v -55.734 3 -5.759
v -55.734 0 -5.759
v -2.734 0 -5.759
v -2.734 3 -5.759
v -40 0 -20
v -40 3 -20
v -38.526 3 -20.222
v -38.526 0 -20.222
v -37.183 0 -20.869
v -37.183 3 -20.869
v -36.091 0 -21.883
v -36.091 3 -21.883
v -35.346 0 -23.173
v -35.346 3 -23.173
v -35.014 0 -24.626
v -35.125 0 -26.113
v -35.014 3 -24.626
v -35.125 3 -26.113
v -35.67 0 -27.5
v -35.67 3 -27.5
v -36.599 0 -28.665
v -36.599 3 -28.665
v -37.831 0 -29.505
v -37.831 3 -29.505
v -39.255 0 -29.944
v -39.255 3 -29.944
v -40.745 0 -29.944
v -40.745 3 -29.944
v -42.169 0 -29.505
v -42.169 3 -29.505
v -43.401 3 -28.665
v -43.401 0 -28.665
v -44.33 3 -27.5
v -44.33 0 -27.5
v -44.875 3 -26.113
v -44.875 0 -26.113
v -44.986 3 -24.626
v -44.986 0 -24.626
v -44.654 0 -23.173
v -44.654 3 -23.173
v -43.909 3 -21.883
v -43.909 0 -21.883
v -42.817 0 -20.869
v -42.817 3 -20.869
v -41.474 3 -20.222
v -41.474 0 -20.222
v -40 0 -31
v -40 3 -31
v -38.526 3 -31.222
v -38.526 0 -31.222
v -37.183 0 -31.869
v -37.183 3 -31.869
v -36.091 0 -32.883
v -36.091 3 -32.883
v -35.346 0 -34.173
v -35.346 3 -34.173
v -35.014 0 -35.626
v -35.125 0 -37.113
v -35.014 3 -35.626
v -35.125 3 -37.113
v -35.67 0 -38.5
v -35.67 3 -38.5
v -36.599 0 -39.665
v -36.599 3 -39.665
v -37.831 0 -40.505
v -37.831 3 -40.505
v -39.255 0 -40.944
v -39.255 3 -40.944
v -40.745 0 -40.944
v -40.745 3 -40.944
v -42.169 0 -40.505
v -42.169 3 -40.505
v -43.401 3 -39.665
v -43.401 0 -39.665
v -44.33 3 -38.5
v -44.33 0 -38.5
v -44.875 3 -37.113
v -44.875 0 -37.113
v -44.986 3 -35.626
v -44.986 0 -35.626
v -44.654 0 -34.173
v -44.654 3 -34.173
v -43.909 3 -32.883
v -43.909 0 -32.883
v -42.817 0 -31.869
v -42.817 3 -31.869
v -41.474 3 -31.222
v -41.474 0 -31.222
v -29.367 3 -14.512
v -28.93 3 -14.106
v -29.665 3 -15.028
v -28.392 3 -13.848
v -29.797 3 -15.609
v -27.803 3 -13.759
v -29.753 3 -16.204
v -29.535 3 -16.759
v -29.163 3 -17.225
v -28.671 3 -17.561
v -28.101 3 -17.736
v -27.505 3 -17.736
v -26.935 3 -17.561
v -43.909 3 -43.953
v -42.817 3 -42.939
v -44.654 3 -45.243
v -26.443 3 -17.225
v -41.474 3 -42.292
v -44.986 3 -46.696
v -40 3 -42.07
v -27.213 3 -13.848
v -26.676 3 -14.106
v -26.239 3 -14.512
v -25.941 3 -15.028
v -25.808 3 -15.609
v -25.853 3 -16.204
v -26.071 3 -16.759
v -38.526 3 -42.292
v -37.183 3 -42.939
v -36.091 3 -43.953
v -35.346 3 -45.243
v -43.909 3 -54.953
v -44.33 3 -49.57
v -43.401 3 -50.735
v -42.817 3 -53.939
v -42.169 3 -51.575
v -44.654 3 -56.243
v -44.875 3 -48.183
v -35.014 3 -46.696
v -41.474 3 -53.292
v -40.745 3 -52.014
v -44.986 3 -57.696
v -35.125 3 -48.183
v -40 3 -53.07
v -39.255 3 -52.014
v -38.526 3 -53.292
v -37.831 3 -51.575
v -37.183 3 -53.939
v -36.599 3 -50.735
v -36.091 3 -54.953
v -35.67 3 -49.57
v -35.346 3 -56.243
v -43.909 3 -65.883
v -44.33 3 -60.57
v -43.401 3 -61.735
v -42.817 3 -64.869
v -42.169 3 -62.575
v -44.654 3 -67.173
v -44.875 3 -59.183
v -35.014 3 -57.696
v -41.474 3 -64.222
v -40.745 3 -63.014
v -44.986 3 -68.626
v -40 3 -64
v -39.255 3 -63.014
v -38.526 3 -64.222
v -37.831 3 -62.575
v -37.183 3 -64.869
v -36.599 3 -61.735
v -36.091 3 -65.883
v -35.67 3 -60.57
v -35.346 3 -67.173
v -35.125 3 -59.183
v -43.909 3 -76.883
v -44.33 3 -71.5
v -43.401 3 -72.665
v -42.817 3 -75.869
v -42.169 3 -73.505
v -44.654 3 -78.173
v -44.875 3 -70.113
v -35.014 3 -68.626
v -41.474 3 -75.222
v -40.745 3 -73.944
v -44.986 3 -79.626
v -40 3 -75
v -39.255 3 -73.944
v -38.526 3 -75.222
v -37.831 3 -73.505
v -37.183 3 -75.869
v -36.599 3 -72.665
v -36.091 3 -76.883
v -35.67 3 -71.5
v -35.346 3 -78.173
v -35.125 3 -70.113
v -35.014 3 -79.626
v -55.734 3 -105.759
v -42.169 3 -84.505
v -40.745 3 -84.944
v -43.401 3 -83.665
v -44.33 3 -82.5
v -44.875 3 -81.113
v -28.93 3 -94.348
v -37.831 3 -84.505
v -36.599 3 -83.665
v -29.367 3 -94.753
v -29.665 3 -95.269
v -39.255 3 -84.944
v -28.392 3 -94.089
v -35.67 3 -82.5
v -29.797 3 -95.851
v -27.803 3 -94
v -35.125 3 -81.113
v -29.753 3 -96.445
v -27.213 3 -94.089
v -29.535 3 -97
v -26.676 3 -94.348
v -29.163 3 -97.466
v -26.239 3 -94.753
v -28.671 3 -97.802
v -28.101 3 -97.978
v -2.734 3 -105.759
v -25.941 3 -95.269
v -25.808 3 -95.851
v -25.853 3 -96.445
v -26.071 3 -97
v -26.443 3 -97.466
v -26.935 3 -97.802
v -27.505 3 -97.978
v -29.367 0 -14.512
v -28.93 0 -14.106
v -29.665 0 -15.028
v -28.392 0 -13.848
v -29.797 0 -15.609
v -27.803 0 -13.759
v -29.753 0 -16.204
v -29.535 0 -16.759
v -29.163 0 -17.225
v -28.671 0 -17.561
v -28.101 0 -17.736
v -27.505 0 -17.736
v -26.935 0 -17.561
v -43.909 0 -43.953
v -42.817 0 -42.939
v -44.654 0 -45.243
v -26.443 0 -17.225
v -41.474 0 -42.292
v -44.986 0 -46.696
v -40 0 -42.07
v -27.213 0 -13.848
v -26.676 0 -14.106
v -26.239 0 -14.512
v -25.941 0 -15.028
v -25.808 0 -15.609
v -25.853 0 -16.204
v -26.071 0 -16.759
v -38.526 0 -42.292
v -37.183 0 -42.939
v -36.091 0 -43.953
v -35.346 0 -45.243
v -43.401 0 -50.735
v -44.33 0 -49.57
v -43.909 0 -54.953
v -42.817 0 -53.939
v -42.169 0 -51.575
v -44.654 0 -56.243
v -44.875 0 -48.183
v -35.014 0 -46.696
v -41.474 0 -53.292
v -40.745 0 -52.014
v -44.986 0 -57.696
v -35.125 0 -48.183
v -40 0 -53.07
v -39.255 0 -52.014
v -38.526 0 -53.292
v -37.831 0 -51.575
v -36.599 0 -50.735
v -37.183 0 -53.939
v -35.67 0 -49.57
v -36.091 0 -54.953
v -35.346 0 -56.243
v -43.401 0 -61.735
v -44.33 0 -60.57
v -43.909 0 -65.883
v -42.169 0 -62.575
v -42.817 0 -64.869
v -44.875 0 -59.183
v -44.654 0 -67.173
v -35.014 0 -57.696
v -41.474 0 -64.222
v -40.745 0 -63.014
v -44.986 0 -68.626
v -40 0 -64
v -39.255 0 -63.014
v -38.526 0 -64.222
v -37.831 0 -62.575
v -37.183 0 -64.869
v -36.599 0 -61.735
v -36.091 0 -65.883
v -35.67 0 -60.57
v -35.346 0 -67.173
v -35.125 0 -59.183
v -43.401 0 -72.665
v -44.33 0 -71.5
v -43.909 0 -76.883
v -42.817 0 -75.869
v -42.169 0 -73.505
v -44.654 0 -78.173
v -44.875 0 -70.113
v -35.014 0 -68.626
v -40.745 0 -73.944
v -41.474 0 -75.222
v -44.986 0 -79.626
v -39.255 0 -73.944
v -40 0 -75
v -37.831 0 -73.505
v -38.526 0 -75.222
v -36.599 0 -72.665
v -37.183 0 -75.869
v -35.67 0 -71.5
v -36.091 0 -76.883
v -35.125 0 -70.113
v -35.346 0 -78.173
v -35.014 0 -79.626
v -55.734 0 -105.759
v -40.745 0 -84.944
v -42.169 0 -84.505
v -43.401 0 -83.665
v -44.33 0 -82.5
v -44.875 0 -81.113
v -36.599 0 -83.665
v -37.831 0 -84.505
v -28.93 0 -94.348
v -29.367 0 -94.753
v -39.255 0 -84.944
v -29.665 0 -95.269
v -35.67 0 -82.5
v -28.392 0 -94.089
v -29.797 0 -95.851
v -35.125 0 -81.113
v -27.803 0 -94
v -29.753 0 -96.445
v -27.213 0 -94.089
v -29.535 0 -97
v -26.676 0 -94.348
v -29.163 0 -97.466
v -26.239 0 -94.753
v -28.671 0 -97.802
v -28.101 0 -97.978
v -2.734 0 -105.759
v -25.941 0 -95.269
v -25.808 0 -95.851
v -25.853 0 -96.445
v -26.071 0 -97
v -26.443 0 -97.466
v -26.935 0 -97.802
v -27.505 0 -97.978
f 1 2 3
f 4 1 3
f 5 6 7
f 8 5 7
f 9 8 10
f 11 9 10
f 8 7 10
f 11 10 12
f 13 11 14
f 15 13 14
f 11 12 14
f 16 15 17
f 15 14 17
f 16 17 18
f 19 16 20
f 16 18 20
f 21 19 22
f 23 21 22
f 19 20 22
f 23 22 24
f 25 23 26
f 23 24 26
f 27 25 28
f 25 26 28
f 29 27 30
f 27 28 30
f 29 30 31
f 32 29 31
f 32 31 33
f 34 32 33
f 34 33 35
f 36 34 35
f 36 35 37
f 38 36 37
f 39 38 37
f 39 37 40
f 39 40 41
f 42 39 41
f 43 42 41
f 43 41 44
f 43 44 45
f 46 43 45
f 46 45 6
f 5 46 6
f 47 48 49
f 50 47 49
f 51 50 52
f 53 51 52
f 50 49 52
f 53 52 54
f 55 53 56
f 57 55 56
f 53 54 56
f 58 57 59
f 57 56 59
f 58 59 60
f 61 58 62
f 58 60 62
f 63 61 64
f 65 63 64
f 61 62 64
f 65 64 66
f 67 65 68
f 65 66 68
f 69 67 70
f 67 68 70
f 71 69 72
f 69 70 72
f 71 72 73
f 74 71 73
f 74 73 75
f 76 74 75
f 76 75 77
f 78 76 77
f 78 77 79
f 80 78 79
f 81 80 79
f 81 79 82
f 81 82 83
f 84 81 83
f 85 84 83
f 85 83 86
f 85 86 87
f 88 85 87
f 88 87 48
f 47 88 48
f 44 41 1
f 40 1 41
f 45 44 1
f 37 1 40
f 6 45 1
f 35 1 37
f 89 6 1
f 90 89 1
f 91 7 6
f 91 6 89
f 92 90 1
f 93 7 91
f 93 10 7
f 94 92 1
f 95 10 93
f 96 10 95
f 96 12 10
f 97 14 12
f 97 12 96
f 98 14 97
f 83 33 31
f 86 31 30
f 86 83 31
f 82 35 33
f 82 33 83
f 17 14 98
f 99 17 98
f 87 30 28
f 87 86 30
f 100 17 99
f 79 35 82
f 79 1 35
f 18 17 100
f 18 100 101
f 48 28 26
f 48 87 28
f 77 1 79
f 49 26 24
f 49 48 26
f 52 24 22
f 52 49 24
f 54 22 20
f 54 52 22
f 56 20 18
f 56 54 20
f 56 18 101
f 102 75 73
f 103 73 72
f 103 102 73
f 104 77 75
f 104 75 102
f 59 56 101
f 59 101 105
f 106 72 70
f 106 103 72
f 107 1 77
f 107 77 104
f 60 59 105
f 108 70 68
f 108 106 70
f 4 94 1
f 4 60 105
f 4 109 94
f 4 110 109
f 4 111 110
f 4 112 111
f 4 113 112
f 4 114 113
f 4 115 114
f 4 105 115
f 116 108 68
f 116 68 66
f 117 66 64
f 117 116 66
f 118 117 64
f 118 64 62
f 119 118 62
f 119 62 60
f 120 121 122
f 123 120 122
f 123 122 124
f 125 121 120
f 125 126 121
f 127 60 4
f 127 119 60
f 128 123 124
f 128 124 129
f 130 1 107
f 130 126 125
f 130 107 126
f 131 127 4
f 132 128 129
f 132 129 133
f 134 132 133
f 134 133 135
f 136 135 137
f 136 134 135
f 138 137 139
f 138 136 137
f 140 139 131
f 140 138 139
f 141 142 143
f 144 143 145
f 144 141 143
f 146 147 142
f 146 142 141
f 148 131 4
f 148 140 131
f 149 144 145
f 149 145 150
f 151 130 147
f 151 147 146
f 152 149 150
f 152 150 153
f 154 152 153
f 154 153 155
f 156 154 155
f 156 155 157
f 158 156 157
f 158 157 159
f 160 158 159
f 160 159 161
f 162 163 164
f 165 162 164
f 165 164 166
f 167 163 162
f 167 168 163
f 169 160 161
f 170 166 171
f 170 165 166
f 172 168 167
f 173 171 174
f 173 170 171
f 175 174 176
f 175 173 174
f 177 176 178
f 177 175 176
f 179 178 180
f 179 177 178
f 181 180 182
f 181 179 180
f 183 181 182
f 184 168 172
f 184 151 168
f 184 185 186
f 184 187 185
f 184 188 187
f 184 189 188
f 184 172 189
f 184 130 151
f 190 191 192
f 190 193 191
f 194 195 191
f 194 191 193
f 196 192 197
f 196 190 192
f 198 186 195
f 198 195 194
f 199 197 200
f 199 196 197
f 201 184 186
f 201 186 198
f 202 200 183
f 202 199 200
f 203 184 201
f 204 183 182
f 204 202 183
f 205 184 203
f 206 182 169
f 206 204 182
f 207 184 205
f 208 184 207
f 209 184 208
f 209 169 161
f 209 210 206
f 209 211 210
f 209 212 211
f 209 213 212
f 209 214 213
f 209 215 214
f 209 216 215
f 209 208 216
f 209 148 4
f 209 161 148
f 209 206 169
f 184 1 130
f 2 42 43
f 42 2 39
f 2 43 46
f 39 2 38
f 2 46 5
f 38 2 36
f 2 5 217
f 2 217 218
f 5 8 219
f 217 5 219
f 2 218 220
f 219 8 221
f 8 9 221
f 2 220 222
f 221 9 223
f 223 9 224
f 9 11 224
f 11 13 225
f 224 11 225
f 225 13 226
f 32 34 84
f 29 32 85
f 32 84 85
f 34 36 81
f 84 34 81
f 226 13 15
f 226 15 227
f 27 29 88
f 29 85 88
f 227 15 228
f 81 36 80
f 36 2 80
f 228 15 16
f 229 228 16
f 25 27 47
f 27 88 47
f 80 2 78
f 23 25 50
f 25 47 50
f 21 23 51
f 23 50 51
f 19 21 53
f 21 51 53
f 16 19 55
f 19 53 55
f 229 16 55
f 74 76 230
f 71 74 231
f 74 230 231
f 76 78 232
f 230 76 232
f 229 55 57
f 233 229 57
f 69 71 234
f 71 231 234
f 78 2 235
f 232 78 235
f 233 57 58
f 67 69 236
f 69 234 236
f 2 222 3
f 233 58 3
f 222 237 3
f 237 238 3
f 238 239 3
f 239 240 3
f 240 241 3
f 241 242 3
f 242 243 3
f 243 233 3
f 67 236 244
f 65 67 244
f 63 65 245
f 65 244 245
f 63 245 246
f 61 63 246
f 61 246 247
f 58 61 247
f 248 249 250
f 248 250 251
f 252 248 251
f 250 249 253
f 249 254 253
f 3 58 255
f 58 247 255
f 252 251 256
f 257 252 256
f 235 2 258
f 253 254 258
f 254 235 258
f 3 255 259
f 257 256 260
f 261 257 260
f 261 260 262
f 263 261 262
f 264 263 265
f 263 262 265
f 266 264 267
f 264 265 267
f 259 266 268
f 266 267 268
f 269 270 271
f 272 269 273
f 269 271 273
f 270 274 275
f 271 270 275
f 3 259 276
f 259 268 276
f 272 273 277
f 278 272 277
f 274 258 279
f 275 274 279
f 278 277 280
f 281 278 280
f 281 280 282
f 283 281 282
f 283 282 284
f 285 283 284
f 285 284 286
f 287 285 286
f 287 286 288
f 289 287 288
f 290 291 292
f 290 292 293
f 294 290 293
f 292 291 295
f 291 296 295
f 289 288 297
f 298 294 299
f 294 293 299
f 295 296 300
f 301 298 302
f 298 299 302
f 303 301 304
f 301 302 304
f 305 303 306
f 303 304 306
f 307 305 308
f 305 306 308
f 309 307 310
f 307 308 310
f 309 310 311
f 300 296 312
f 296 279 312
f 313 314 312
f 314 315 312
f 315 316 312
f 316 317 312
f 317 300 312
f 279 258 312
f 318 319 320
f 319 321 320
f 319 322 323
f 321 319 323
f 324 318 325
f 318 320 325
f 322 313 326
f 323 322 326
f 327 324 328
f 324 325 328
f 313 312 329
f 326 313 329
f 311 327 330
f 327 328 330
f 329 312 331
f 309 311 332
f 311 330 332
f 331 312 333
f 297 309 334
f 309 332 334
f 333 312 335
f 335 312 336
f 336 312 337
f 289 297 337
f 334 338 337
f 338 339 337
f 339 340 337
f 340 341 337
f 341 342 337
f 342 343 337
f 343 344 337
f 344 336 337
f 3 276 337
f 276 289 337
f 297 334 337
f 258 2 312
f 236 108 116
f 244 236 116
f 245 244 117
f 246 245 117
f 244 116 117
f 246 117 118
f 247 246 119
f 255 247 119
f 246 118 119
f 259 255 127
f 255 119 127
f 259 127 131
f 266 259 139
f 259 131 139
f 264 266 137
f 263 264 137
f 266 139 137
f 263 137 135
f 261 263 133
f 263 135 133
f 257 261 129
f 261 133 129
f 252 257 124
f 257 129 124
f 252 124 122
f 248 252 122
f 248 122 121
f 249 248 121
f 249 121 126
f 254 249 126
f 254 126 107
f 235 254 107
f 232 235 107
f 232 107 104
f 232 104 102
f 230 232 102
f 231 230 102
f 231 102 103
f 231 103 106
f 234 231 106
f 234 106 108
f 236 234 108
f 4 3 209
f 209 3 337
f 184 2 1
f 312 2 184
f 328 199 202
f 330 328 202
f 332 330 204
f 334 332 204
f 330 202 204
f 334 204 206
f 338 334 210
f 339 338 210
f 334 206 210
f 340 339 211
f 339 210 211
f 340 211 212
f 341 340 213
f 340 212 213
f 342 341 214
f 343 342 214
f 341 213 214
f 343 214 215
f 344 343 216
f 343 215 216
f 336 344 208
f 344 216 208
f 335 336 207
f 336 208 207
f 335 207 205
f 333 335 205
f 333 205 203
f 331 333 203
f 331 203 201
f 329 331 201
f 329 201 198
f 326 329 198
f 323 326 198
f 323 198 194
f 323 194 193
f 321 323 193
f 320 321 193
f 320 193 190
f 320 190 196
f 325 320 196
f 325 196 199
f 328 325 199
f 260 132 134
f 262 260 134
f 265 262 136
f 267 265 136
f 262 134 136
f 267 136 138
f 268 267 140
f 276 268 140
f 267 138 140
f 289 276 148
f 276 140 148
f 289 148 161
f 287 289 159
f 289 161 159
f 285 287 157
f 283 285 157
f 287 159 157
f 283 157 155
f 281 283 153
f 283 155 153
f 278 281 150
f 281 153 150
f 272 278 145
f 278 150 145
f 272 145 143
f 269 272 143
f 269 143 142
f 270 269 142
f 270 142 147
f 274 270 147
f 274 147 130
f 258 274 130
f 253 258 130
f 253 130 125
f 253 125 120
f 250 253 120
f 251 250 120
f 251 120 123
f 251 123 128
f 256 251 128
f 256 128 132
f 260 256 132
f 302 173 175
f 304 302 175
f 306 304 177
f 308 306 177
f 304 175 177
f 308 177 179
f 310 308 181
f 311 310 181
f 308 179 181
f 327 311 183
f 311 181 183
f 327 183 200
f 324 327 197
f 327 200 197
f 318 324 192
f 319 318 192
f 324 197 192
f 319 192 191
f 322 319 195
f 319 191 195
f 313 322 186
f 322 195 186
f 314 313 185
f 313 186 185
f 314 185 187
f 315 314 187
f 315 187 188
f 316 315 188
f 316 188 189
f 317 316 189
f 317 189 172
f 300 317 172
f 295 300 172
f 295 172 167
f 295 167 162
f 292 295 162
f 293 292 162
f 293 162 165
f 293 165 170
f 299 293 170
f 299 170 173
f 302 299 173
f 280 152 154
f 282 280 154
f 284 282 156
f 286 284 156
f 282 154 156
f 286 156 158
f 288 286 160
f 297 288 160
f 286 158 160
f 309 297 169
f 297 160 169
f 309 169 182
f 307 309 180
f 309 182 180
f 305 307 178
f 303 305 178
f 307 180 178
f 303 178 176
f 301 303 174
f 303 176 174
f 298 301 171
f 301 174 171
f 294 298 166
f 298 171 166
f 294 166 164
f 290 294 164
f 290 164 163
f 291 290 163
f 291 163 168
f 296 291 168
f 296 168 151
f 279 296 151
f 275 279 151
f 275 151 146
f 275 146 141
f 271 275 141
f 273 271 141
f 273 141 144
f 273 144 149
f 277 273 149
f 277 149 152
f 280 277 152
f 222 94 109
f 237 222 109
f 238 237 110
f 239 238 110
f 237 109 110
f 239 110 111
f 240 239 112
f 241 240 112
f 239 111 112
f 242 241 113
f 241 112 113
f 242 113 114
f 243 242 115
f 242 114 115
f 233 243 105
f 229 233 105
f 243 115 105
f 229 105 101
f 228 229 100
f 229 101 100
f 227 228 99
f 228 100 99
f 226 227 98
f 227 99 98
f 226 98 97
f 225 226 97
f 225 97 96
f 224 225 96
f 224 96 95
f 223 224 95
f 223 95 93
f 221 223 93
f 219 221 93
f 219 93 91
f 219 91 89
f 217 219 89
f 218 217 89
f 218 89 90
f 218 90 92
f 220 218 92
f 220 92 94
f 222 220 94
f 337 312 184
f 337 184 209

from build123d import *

# Parameters (mm, degrees)
ESBO_O2_W                = 53
ESBO_O2_H                = 100
RESSALTO_EXTRUS_O1_DEPTH = 3
ESBO_O14_R               = 2
CORTE_EXTRUS_O10_DEPTH   = 10
ESBO_O8_R                = 5
CORTE_EXTRUS_O11_DEPTH   = 10
ESBO_O4_R                = 2
CORTE_EXTRUS_O12_DEPTH   = 10


with BuildPart() as part:
    # Esboço2 → Ressalto-extrusão1 (new body)
    with BuildSketch(Plane(origin=(-2.802903092, 0, -5.758743908), x_dir=(1, 0, 0), z_dir=(0, 1, 0))):
        with Locations((-26.430669922, 50)):
            Rectangle(ESBO_O2_W, ESBO_O2_H)
    extrude(amount=RESSALTO_EXTRUS_O1_DEPTH)

    # Esboço14 → Corte-extrusão10 (cut)
    with BuildSketch(Plane(origin=(0, 3, 0), x_dir=(1, 0, 0), z_dir=(0, 1, 0))):
        with Locations(Location((-27.802903092, 15.758743908, 0), (0, 0, 270))):
            Circle(ESBO_O14_R)
    extrude(amount=-CORTE_EXTRUS_O10_DEPTH, mode=Mode.SUBTRACT)

    # Esboço8 → Corte-extrusão11 (cut)
    with BuildSketch(Plane(origin=(0, 3, 0), x_dir=(1, 0, 0), z_dir=(0, 1, 0))):
        with Locations(Location((-40, 25, 0), (0, 0, 270))):
            Circle(ESBO_O8_R)
        with Locations(Location((-40, 36, 0), (0, 0, 270))):
            Circle(ESBO_O8_R)
        with Locations(Location((-40, 47.07, 0), (0, 0, 270))):
            Circle(ESBO_O8_R)
        with Locations(Location((-40, 58.07, 0), (0, 0, 270))):
            Circle(ESBO_O8_R)
        with Locations(Location((-40, 69, 0), (0, 0, 270))):
            Circle(ESBO_O8_R)
        with Locations(Location((-40, 80, 0), (0, 0, 270))):
            Circle(ESBO_O8_R)
    extrude(amount=-CORTE_EXTRUS_O11_DEPTH, mode=Mode.SUBTRACT)

    # Esboço4 → Corte-extrusão12 (cut)
    with BuildSketch(Plane(origin=(0, 3, 0), x_dir=(1, 0, 0), z_dir=(0, 1, 0))):
        with Locations(Location((-27.802903092, 96, 0), (0, 0, 270))):
            Circle(ESBO_O4_R)
    extrude(amount=-CORTE_EXTRUS_O12_DEPTH, mode=Mode.SUBTRACT)


solid = part.part
